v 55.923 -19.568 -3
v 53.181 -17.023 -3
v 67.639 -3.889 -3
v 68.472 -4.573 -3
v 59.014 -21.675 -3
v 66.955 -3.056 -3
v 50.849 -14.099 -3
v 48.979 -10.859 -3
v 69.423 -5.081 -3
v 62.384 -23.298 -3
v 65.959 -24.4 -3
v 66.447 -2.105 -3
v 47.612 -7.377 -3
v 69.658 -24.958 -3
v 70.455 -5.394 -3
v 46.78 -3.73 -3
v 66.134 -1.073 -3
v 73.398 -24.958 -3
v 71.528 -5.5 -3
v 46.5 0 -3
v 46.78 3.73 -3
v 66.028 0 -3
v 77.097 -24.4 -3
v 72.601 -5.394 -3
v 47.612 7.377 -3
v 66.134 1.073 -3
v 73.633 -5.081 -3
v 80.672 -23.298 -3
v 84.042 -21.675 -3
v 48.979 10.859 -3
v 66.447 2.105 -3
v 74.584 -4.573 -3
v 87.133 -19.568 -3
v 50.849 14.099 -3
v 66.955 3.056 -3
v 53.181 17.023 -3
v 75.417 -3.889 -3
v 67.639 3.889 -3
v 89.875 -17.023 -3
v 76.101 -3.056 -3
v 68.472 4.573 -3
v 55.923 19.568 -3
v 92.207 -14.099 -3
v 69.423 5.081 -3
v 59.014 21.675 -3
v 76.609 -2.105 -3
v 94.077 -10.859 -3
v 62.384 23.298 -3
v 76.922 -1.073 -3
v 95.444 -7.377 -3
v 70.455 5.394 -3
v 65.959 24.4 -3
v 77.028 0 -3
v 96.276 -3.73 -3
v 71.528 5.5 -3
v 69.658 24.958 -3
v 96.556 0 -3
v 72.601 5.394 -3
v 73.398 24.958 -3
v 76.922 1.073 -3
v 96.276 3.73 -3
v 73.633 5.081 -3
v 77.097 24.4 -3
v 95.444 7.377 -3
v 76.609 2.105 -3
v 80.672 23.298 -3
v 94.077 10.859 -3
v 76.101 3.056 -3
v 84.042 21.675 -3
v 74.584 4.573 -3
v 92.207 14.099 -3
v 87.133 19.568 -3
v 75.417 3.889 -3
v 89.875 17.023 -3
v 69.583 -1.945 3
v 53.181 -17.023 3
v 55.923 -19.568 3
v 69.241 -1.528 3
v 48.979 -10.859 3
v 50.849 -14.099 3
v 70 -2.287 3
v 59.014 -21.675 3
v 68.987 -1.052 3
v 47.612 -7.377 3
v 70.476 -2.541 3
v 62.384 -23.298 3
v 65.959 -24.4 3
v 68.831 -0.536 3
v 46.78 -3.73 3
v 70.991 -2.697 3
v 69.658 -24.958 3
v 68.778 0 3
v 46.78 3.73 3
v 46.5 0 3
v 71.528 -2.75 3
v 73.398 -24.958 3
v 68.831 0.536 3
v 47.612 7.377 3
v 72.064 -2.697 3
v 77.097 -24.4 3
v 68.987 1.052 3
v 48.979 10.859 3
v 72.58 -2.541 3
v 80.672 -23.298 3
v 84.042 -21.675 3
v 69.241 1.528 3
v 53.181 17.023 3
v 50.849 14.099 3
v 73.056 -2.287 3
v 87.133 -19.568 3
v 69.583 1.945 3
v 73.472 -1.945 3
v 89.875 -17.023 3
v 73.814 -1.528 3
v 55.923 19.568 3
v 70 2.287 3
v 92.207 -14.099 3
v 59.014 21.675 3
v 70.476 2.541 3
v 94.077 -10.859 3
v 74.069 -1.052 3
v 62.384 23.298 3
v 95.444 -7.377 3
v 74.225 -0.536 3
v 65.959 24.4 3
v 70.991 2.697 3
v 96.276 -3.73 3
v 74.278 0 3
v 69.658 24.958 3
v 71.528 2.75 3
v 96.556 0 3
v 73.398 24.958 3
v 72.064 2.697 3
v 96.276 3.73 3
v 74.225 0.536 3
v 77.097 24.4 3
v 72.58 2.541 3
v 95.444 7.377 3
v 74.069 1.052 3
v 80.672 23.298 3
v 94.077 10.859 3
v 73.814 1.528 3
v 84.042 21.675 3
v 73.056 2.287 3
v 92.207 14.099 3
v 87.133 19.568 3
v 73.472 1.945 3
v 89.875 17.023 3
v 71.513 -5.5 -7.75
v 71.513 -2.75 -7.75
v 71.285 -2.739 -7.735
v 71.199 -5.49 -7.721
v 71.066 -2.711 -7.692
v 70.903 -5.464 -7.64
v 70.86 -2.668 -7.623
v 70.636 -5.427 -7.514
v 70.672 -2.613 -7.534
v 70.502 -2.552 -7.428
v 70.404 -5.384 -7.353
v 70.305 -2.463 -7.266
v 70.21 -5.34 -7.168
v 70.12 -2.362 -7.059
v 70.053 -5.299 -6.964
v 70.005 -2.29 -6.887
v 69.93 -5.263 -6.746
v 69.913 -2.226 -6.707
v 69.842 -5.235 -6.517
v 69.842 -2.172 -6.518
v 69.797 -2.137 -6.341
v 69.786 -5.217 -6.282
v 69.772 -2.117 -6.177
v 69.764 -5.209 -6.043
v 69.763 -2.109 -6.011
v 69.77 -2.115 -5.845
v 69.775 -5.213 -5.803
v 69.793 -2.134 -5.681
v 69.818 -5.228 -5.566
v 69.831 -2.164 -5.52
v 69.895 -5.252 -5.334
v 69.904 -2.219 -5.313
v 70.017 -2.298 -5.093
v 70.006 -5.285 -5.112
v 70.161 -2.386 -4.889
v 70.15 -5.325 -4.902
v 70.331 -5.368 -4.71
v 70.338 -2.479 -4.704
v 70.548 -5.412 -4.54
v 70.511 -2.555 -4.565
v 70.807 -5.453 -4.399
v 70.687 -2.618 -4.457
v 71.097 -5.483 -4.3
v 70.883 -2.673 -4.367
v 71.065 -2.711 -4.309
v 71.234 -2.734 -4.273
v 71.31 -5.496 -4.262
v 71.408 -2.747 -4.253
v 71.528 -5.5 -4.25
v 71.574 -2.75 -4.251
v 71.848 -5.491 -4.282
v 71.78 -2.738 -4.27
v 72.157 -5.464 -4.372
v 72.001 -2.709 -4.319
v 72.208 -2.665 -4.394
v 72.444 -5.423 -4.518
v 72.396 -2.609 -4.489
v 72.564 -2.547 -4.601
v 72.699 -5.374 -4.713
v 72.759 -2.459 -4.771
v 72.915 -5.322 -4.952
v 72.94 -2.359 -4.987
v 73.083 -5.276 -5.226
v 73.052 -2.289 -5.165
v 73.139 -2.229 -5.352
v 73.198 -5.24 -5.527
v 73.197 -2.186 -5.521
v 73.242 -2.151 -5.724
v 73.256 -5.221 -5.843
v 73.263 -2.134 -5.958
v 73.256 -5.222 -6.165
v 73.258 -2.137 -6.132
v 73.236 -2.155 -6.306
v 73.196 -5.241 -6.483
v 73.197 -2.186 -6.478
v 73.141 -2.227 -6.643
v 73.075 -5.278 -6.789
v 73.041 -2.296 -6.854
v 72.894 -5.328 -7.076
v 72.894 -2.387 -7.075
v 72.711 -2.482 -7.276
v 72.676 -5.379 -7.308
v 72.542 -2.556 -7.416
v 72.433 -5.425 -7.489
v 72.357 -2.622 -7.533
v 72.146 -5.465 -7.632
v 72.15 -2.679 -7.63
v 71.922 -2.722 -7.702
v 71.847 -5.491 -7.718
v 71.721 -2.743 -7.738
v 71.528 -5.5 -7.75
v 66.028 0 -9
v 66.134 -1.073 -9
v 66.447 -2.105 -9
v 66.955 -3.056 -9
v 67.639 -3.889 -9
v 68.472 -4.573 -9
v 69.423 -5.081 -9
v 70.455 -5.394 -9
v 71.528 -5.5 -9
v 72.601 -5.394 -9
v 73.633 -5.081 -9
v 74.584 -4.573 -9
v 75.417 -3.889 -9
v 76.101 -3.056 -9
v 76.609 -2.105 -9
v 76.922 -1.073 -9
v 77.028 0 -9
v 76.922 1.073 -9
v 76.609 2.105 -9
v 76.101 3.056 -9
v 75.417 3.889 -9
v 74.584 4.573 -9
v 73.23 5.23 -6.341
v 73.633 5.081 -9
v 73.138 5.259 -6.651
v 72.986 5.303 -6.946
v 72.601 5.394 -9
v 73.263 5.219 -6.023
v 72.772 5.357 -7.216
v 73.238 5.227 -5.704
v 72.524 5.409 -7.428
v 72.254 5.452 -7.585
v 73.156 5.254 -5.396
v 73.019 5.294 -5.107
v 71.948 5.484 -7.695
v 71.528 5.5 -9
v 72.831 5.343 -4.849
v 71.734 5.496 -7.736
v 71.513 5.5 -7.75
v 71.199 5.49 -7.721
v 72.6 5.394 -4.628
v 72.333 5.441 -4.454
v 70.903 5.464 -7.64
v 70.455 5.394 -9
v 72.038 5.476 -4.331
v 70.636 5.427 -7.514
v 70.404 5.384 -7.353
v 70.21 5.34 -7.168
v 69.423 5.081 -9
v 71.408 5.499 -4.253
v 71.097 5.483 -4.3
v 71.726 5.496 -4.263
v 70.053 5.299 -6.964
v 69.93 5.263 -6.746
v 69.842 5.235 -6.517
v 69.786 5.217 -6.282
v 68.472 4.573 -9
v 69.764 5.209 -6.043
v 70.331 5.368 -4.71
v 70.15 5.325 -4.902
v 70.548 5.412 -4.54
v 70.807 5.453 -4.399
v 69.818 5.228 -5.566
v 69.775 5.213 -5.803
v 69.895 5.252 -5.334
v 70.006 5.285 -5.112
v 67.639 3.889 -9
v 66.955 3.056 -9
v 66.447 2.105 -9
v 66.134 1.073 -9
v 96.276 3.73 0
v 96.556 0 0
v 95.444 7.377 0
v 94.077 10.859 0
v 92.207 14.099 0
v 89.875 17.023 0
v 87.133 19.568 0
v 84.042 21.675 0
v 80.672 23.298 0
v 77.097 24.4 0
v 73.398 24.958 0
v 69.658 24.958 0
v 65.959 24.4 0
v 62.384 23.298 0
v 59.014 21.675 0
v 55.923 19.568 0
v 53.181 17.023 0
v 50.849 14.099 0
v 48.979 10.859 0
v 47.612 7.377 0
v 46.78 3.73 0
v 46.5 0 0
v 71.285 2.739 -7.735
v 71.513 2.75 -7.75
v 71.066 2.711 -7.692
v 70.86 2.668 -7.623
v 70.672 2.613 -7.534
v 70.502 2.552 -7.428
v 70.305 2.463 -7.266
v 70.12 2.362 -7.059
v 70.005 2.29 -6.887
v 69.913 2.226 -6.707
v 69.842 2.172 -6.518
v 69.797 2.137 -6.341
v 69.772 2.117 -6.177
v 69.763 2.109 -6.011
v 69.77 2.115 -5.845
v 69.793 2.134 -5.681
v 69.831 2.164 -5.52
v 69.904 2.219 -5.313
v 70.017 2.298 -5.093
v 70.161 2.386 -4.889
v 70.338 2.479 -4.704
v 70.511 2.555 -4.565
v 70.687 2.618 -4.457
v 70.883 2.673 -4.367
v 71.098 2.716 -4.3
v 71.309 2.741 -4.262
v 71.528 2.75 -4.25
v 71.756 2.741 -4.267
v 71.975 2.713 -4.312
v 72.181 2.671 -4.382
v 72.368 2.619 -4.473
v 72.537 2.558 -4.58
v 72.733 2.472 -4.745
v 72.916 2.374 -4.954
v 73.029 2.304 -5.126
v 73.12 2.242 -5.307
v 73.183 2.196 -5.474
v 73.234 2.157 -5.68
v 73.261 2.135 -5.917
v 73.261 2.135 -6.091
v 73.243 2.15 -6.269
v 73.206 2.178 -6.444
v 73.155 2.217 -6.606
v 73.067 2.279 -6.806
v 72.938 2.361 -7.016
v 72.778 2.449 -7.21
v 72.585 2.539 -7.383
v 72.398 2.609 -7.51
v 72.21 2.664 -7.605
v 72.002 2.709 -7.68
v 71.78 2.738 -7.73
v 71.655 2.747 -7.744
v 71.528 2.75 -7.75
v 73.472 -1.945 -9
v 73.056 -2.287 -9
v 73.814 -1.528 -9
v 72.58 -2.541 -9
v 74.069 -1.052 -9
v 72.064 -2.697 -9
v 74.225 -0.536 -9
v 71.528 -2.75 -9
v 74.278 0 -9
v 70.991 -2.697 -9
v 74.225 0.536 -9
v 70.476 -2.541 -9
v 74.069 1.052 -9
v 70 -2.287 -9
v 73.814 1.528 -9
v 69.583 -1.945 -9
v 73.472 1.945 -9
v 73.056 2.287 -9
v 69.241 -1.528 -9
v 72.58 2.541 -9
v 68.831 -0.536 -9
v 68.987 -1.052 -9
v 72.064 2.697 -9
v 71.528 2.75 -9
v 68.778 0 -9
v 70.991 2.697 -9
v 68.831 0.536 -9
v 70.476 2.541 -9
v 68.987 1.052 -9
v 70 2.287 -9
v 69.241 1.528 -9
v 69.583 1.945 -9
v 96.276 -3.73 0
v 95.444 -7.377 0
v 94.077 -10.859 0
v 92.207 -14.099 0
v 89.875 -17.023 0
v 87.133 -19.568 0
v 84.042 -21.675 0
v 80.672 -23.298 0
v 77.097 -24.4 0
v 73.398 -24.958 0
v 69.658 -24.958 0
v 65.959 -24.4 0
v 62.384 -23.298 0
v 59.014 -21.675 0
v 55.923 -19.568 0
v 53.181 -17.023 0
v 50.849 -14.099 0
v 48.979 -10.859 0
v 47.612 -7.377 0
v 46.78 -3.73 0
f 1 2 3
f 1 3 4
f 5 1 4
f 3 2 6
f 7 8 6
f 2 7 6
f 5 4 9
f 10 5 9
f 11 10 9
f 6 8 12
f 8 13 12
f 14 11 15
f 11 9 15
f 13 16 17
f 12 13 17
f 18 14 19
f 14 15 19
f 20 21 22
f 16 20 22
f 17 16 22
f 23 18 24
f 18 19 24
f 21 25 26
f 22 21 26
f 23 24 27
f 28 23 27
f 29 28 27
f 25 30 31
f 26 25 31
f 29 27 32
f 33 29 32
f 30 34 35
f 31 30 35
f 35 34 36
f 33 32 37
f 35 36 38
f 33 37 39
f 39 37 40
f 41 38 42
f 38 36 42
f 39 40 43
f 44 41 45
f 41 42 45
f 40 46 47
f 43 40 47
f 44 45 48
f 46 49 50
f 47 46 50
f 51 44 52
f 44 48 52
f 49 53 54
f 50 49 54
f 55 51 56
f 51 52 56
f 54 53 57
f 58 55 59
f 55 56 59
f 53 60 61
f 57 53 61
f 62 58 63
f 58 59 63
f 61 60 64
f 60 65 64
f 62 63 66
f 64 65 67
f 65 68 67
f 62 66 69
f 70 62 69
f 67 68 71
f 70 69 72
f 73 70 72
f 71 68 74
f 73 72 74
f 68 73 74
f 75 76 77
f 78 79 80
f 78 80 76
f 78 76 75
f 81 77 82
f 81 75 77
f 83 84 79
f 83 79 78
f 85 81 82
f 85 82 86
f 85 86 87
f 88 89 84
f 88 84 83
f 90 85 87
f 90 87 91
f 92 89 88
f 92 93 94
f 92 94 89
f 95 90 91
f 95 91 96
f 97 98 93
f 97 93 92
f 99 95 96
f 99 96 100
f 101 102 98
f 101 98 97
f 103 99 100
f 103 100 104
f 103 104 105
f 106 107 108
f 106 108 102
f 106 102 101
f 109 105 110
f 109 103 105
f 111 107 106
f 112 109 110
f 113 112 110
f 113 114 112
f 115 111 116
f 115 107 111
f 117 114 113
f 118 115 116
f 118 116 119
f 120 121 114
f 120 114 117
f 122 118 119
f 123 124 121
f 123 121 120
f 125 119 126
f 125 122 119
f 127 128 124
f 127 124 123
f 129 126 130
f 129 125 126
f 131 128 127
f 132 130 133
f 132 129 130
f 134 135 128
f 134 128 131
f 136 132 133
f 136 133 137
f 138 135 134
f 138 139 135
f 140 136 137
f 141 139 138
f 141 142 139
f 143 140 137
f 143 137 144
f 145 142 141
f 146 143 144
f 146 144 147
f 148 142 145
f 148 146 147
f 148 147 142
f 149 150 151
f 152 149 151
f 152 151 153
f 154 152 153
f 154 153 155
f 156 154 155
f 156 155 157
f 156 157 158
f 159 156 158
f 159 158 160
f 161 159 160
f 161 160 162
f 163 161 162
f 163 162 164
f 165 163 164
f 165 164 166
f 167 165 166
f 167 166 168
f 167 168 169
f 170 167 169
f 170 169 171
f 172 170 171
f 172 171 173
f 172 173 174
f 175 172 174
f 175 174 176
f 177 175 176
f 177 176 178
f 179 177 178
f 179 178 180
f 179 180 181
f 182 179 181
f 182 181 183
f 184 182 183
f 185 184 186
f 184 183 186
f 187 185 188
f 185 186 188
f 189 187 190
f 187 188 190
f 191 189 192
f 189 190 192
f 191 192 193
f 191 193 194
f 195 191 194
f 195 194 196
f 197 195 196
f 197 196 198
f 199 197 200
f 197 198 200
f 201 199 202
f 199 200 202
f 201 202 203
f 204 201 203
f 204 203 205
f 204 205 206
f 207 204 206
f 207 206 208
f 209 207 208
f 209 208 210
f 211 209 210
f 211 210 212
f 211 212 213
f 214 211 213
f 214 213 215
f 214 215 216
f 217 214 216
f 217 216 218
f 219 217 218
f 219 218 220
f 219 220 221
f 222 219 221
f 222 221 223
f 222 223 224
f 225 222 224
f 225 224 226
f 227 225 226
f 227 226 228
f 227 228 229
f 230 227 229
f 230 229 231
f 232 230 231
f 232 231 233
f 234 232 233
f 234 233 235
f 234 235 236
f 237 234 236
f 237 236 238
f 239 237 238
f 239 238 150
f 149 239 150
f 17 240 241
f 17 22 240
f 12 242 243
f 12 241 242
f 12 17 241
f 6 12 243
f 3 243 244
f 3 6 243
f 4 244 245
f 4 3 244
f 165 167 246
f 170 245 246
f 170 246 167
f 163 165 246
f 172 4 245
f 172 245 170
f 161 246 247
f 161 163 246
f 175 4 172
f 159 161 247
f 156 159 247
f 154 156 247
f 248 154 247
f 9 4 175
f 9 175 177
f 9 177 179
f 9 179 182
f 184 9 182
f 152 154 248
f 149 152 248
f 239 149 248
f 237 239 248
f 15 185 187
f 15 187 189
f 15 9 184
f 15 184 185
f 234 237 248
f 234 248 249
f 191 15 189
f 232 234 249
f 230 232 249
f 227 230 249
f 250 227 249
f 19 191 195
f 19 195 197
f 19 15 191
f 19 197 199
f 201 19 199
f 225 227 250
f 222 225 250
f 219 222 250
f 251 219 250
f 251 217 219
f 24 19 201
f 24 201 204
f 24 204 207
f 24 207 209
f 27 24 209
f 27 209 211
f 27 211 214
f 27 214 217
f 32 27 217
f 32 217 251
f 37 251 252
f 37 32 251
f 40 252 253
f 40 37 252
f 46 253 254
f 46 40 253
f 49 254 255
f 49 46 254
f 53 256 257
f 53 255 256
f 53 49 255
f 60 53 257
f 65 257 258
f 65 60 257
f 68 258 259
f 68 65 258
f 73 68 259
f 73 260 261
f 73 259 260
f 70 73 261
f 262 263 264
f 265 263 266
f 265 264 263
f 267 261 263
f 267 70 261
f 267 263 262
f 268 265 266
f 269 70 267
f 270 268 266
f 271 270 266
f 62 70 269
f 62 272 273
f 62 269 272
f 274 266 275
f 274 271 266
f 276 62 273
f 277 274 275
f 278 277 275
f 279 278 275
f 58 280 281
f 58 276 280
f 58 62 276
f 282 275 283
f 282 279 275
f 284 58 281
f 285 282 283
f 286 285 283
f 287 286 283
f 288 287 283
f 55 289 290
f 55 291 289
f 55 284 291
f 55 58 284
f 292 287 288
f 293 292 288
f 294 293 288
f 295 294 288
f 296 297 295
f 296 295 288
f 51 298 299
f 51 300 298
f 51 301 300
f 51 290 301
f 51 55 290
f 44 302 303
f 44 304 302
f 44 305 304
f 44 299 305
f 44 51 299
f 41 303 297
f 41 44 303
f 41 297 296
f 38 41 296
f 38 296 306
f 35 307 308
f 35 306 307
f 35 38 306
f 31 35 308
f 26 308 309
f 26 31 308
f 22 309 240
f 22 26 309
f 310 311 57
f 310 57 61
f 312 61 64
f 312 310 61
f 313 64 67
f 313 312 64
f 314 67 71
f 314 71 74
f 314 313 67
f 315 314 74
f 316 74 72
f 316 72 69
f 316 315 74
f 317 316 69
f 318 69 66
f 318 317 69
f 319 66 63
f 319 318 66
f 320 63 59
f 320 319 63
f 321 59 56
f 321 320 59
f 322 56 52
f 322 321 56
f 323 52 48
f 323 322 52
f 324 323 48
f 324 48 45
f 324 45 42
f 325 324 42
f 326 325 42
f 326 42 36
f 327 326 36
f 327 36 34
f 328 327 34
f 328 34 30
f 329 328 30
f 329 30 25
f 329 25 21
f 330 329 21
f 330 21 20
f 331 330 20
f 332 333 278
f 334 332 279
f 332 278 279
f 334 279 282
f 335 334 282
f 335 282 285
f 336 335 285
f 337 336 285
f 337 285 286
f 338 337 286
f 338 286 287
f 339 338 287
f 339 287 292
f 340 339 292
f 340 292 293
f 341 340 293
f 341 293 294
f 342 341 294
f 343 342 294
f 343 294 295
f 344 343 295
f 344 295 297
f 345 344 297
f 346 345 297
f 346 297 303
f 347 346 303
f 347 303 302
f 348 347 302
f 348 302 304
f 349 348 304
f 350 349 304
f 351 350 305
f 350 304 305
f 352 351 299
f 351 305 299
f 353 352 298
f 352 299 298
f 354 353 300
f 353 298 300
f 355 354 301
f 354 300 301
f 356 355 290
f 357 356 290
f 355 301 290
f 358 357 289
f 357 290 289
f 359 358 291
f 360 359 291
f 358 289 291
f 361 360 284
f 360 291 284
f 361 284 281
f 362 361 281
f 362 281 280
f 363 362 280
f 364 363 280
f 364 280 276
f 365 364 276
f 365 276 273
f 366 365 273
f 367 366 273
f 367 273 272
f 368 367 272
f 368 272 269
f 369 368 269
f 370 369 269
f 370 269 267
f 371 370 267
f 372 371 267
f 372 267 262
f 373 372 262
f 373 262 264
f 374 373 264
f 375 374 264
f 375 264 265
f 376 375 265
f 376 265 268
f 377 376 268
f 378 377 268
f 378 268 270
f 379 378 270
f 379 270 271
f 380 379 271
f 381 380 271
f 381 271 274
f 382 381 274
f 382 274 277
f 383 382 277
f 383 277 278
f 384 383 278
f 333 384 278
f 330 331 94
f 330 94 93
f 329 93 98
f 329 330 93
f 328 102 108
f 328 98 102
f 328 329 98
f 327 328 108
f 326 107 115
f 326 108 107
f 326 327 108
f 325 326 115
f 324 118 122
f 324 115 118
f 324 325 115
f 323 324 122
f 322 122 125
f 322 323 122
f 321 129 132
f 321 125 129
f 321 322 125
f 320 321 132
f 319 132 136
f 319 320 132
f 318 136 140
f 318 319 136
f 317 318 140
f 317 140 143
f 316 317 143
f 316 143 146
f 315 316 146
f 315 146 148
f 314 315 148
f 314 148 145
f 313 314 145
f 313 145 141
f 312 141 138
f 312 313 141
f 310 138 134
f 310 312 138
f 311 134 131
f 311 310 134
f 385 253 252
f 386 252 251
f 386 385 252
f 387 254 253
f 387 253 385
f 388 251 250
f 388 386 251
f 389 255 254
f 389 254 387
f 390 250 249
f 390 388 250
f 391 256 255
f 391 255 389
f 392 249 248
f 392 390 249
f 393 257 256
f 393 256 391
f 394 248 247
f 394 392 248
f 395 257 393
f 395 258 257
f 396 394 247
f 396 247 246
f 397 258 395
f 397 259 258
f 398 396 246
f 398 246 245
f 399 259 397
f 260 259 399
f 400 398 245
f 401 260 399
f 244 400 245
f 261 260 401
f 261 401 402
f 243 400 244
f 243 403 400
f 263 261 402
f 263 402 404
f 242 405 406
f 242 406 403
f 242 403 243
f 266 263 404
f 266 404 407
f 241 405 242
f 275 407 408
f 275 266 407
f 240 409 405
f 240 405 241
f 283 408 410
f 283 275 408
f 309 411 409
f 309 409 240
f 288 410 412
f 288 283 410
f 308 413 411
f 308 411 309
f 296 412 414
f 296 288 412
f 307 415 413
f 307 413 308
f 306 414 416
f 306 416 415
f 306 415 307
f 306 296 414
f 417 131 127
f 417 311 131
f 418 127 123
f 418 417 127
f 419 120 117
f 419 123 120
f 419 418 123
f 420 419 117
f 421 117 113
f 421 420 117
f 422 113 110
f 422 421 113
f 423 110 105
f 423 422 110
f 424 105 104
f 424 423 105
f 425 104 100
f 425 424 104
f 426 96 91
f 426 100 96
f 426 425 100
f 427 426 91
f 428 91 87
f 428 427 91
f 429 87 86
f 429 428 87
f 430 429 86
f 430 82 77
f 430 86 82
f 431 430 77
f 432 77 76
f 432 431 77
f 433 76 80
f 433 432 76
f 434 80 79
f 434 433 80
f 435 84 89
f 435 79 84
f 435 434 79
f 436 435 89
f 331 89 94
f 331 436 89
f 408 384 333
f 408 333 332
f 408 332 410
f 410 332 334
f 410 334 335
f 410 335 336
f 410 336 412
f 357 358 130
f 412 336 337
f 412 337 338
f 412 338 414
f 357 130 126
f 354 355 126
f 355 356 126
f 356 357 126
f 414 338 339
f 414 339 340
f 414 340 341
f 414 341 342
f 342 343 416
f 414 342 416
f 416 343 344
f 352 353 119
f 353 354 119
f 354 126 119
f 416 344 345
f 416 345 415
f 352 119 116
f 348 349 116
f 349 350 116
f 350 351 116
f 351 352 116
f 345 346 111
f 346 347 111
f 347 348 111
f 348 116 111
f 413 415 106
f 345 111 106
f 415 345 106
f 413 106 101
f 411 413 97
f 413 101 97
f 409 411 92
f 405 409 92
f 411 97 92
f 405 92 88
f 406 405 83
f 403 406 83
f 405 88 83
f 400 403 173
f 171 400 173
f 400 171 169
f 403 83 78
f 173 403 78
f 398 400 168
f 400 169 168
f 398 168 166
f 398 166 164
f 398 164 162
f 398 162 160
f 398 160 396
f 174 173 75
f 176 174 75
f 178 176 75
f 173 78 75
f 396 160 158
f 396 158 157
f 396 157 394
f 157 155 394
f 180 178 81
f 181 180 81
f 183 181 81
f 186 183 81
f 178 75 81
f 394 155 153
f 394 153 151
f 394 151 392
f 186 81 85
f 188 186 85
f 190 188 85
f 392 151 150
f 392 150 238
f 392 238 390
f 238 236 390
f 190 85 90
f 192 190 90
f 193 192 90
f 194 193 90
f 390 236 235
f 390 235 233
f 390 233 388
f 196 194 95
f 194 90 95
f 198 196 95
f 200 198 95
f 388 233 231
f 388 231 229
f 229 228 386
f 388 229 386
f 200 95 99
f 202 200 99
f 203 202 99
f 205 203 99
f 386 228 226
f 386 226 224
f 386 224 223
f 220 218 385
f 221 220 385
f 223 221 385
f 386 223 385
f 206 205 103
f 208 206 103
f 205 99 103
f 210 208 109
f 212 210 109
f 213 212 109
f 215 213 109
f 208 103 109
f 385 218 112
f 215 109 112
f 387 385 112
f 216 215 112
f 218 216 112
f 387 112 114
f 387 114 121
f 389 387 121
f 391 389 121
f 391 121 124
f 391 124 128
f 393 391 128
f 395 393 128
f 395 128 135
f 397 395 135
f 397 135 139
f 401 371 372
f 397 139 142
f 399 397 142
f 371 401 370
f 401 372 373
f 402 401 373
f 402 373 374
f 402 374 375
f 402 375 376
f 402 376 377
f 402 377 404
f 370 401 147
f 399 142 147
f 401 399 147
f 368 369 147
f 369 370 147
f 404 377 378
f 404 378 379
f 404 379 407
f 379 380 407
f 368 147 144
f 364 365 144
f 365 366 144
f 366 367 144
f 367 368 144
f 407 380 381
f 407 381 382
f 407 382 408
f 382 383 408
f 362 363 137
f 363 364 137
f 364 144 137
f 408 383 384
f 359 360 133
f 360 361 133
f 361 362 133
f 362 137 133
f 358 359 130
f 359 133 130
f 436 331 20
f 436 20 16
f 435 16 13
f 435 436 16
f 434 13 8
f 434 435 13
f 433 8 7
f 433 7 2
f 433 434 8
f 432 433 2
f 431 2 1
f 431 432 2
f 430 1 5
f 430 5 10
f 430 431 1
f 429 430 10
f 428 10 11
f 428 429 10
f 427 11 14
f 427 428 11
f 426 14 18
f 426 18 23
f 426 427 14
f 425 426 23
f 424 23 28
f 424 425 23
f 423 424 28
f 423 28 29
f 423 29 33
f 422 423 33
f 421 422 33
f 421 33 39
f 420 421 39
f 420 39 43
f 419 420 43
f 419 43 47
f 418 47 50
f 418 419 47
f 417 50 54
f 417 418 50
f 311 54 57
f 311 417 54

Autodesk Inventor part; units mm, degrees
ref_plane "YZ Plane" through (0, 0, 0) normal (1, 0, 0) x (0, 1, 0)
ref_plane "XY Plane" through (0, 0, 0) normal (0, 0, 1) x (1, 0, 0)
sketch "Sketch1" plane through (0, 0, 0) normal (0, 0, 1) x (1, 0, 0)
  circle A0 centre (71.5279, 0) radius 25.0279
  circle A1 centre (0, 0) radius 46.5 projected
extrude "Extrusion1" add sketch "Sketch1" along normal mid plane 6 contours A0
sketch "Sketch2" plane through (71.5279, 0, -3) normal (0, 0, -1) x (-1, 0, 0)
  circle A0 centre (0, 0) radius 25.0279 projected
  circle A1 centre (0, 0) radius 5.5
  point P0 (71.5279, 0)
  dimension "d2" = 11
extrude "Extrusion2" add sketch "Sketch2" along normal blind 6 contours A1
hole "Hole1" at (71.5279, 0, -9) direction (0, 0, 1) diameter 5.5 end through all
ref_plane "Work Plane1" through (71.5279, -5.5, -3) normal (0, 1, 0) x (-1, 0, 0)
sketch "Sketch3" plane through (71.5279, -5.5, -3) normal (0, 1, 0) x (-1, 0, 0)
  line L0 (-5.5, -6) -> (5.5, -6) projected
  line L1 (5.5, 0) -> (-5.5, 0) projected
  point P0 (71.5279, 3)
  point P1 (0.0146, -3)
  dimension "d14" = 3
hole "Hole2" at (71.5134, -5.5, -6) direction (0, 1, 0) diameter 3.5 end through all
properties part number "drive_wheel"
